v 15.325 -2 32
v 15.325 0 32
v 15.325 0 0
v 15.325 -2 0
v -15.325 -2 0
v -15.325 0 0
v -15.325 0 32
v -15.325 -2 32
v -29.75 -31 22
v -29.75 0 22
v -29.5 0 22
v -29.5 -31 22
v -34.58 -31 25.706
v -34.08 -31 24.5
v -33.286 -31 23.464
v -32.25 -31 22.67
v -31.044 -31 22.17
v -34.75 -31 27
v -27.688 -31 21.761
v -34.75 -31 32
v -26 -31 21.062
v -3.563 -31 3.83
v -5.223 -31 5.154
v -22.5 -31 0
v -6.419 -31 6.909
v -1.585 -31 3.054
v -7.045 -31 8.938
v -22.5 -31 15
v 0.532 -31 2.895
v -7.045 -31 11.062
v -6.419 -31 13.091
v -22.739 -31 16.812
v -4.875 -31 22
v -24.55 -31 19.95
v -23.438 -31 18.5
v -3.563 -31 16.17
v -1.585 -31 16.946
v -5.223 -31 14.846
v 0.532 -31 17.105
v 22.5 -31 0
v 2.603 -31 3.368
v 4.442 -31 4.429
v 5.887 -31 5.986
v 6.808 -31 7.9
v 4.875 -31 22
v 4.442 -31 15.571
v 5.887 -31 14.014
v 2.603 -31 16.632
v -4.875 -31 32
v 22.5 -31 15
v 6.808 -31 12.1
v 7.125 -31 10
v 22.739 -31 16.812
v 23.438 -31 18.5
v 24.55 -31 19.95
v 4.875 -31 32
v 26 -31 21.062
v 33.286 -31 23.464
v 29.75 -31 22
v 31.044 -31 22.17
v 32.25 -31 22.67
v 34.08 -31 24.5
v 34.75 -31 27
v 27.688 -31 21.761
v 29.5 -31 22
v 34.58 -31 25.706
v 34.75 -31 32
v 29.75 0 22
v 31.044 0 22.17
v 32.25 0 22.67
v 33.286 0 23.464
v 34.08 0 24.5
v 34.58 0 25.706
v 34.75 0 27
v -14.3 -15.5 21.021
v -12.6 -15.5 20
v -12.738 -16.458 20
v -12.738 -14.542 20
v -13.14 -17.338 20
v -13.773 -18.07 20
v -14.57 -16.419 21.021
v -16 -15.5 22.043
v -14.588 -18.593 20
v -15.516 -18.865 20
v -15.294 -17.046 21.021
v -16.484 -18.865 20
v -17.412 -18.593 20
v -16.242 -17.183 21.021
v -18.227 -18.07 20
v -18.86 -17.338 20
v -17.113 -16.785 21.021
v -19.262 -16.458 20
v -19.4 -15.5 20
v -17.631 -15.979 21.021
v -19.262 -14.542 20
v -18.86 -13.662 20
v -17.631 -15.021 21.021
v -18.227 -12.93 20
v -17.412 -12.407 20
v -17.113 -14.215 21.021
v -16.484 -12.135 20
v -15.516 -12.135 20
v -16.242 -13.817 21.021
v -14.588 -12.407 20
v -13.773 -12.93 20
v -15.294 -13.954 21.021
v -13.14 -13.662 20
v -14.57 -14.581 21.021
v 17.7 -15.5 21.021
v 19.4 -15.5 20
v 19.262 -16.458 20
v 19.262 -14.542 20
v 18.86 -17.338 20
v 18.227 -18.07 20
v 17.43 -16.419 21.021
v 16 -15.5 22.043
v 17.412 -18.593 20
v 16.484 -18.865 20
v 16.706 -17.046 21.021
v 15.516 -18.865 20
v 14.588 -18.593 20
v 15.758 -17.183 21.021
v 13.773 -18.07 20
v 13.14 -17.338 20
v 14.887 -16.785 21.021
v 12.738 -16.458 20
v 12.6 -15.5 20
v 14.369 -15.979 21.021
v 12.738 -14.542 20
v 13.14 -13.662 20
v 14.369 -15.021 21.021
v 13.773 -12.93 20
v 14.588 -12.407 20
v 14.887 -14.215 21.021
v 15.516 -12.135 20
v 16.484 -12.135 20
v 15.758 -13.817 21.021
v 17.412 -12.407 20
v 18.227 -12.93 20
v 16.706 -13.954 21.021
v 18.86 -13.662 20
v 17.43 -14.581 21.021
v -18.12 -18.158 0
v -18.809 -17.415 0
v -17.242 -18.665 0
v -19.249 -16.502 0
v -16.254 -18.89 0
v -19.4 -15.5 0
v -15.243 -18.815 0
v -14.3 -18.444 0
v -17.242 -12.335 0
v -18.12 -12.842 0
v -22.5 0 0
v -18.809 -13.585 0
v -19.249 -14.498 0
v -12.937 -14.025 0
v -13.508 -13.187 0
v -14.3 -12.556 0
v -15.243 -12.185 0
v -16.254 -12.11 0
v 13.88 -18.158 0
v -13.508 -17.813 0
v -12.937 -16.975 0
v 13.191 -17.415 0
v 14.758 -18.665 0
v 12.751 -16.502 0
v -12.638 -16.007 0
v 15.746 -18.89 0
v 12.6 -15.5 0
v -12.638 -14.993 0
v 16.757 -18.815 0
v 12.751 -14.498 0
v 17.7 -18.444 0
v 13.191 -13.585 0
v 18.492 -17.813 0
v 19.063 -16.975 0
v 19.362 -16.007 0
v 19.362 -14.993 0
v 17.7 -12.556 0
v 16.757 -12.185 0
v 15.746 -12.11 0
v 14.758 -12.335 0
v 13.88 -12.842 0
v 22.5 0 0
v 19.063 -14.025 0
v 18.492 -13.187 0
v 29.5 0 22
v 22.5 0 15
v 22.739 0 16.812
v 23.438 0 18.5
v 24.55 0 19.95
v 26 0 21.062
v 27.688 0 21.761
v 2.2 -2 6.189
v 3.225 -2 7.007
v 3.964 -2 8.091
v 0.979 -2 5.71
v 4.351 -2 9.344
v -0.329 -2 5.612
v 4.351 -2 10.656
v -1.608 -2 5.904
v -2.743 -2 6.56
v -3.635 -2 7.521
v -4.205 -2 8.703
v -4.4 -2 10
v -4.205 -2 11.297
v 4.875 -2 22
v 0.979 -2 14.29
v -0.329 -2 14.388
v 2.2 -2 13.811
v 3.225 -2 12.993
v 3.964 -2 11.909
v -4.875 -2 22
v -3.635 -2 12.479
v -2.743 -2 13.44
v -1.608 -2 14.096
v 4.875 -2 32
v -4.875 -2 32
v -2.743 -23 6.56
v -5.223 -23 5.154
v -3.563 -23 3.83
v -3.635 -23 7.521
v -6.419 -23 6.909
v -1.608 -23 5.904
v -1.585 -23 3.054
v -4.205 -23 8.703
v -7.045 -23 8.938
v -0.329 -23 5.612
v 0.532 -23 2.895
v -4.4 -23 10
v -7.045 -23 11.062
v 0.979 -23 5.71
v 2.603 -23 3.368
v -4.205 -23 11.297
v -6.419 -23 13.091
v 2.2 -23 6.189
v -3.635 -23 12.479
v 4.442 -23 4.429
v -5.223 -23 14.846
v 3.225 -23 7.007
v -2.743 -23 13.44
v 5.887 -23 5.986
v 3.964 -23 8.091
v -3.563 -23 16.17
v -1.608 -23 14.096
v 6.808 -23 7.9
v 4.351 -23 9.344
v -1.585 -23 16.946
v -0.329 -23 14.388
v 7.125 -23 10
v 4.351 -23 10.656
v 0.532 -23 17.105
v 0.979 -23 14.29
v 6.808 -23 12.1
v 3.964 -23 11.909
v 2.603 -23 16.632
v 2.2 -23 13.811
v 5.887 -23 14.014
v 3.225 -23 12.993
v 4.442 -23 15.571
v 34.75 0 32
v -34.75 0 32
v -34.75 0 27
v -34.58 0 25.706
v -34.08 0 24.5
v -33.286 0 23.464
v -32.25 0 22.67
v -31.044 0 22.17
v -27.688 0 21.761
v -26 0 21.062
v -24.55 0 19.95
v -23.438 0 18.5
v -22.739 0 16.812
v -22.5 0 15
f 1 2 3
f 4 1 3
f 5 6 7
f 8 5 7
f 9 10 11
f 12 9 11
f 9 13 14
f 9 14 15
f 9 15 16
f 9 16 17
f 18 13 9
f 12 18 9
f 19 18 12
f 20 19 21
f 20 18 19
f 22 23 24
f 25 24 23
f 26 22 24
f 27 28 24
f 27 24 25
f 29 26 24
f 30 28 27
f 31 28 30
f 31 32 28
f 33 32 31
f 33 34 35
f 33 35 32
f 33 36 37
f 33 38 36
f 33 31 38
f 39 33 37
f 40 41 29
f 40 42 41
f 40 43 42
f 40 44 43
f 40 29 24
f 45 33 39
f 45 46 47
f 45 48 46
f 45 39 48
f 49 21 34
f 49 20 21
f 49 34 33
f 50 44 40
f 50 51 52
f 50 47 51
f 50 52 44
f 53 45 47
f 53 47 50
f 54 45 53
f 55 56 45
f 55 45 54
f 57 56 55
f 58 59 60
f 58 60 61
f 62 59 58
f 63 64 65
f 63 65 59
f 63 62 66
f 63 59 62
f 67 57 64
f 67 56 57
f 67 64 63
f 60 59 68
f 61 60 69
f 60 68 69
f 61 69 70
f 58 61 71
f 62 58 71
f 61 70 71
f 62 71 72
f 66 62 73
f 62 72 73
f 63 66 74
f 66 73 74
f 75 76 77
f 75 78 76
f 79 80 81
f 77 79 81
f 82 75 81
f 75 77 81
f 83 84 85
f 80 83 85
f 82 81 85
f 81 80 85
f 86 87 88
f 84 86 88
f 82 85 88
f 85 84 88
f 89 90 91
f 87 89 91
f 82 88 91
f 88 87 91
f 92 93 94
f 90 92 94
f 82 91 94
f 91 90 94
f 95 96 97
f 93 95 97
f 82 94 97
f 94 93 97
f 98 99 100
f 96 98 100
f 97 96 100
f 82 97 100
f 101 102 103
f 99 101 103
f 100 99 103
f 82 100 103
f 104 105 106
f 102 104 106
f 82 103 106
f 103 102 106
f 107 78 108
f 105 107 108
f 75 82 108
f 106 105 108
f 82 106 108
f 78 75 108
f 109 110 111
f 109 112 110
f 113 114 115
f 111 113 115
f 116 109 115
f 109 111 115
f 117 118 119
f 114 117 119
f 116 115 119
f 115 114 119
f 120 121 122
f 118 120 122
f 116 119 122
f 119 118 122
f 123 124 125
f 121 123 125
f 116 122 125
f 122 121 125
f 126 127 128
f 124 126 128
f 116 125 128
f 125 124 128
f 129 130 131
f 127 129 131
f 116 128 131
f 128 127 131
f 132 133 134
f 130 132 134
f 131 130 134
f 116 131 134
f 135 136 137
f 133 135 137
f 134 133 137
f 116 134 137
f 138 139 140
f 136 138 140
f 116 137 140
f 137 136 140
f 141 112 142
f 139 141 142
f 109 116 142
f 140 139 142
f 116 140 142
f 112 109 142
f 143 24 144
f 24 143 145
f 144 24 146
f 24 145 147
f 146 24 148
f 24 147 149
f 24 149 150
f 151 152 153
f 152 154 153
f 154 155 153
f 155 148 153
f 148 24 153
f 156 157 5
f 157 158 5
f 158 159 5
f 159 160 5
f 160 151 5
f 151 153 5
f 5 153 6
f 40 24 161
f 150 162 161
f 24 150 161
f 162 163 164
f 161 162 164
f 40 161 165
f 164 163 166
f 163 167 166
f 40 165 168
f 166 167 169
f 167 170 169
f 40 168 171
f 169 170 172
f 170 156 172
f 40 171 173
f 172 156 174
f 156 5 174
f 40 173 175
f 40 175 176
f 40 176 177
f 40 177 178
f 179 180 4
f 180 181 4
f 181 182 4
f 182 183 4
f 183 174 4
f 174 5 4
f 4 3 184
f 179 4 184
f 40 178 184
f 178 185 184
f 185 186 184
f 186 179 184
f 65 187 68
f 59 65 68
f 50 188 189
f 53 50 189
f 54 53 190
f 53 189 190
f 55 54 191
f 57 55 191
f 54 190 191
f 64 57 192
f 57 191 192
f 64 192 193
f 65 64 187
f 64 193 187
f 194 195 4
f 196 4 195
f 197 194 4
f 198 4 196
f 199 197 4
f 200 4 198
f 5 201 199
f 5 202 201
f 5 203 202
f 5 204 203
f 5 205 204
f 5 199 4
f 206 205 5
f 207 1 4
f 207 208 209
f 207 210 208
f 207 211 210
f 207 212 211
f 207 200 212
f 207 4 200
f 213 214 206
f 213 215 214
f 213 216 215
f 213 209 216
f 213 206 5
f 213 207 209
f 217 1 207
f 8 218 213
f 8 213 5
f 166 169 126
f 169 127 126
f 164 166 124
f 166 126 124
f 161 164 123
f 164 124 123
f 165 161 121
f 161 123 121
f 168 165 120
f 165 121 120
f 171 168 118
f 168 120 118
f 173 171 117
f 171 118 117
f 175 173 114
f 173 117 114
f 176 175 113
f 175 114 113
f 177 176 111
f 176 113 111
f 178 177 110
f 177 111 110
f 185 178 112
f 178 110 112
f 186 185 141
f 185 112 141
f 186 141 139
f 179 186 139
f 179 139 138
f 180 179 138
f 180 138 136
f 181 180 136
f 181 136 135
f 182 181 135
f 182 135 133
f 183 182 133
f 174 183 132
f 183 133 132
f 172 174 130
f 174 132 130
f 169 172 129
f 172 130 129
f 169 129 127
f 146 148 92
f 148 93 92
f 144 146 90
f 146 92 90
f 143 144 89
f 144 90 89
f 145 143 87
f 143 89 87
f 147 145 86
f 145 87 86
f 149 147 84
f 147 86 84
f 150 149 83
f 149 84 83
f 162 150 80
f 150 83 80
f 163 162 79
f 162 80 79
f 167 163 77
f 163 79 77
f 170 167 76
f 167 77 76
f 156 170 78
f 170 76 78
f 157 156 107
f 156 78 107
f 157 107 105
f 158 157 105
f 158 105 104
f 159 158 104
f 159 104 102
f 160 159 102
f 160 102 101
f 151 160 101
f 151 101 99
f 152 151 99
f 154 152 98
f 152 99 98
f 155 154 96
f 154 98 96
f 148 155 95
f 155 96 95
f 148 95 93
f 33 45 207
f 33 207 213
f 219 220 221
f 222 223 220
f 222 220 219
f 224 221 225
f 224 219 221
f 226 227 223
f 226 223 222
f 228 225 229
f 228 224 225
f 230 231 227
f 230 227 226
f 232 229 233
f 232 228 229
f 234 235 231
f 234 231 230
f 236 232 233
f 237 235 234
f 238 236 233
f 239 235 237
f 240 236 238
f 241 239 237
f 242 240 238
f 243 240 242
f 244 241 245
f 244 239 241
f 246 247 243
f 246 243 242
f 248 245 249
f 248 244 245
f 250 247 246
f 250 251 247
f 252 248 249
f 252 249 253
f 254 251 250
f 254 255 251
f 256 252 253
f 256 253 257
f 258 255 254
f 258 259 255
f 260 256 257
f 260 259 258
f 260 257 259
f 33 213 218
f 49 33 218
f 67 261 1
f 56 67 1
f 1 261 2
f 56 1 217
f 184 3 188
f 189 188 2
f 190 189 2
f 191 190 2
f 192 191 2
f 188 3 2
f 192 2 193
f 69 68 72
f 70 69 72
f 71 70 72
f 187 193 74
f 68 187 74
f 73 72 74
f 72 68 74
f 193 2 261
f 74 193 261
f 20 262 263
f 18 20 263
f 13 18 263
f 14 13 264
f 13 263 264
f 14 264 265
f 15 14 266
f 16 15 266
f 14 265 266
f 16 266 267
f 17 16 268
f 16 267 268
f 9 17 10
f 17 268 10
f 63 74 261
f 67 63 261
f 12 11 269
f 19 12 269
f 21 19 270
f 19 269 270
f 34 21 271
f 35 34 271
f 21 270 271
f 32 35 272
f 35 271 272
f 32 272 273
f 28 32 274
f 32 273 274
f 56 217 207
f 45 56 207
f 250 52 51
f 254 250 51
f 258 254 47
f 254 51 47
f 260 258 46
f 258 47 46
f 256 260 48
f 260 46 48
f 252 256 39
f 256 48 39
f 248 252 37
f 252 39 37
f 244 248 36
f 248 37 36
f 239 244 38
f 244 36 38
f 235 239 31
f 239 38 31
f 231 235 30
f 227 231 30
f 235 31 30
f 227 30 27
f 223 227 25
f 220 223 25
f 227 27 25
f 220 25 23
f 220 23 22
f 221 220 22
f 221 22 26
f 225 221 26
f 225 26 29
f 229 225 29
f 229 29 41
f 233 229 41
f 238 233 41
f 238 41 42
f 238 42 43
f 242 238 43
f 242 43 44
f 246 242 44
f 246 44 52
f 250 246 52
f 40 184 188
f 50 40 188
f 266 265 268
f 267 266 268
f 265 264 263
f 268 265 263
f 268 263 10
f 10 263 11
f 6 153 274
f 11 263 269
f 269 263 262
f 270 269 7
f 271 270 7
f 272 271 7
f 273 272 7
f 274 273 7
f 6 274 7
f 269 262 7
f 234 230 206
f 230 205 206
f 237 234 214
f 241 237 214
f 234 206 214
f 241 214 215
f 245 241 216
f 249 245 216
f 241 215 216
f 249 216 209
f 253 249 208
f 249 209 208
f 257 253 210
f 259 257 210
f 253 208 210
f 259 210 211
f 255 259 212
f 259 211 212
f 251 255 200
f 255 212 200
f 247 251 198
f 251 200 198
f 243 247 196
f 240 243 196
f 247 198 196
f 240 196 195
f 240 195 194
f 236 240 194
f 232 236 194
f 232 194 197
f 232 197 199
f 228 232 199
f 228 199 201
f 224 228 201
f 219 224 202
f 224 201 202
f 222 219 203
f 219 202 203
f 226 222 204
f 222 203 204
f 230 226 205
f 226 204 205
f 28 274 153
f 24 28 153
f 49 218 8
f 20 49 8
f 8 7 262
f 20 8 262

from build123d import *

# Parameters (mm, degrees)
F1_DEPTH       = 31
F3_DEPTH       = 2
F5_D           = 6.8
F5_DEPTH       = 20
F5_TIP         = 2.0429261047
F7_D           = 8.8
F7_CBORE_D     = 14.25
F7_CBORE_DEPTH = 8


with BuildPart() as f1:
    # F0 (on Front) → F1 (new body)
    with BuildSketch(Plane.XZ):
        with BuildLine():
            Line((-4.875, 32), (-34.75, 32))
            Line((-34.75, 32), (-34.75, 27))
            ThreePointArc((-34.75, 27), (-33.2855339059, 23.4644660941), (-29.75, 22))
            Line((-29.75, 22), (-29.5, 22))
            ThreePointArc((-29.5, 22), (-24.5502525317, 19.9497474683), (-22.5, 15))
            Line((-22.5, 15), (-22.5, 0))
            Line((-22.5, 0), (22.5, 0))
            Line((22.5, 0), (22.5, 15))
            ThreePointArc((22.5, 15), (24.5502525317, 19.9497474683), (29.5, 22))
            Line((29.5, 22), (29.75, 22))
            ThreePointArc((29.75, 22), (33.2855339059, 23.4644660941), (34.75, 27))
            Line((34.75, 27), (34.75, 32))
            Line((34.75, 32), (4.875, 32))
            Line((4.875, 32), (4.875, 22))
            Line((4.875, 22), (-4.875, 22))
            Line((-4.875, 22), (-4.875, 32))
        make_face()
    extrude(amount=F1_DEPTH)

    # F2 (on face) → F3 (cut)
    with BuildSketch(Plane(origin=(0, 0, 0), x_dir=(-1, 0, 0), z_dir=(0, 1, 0))):
        Polygon((15.325, 0), (15.325, 32), (4.875, 32), (4.875, 22), (-4.875, 22), (-4.875, 32), (-15.325, 32), (-15.325, 0), align=None)
    extrude(amount=-F3_DEPTH, mode=Mode.SUBTRACT)

    # F5
    with Locations(Plane(origin=(0, 0, 0), x_dir=(1, 0, 0), z_dir=(0, 0, -1))):
        with Locations((-16, 15.5), (16, 15.5)):
            Hole(F5_D / 2, depth=F5_DEPTH)
            with Locations((0, 0, -(F5_DEPTH + F5_TIP / 2))):  # 118° drill point
                Cone(0, F5_D / 2, F5_TIP, mode=Mode.SUBTRACT)

    # F7 (through all)
    with Locations(Plane.XZ.offset(31)):
        with Locations((0, 10)):
            CounterBoreHole(F7_D / 2, F7_CBORE_D / 2, F7_CBORE_DEPTH)


solid = f1.part
